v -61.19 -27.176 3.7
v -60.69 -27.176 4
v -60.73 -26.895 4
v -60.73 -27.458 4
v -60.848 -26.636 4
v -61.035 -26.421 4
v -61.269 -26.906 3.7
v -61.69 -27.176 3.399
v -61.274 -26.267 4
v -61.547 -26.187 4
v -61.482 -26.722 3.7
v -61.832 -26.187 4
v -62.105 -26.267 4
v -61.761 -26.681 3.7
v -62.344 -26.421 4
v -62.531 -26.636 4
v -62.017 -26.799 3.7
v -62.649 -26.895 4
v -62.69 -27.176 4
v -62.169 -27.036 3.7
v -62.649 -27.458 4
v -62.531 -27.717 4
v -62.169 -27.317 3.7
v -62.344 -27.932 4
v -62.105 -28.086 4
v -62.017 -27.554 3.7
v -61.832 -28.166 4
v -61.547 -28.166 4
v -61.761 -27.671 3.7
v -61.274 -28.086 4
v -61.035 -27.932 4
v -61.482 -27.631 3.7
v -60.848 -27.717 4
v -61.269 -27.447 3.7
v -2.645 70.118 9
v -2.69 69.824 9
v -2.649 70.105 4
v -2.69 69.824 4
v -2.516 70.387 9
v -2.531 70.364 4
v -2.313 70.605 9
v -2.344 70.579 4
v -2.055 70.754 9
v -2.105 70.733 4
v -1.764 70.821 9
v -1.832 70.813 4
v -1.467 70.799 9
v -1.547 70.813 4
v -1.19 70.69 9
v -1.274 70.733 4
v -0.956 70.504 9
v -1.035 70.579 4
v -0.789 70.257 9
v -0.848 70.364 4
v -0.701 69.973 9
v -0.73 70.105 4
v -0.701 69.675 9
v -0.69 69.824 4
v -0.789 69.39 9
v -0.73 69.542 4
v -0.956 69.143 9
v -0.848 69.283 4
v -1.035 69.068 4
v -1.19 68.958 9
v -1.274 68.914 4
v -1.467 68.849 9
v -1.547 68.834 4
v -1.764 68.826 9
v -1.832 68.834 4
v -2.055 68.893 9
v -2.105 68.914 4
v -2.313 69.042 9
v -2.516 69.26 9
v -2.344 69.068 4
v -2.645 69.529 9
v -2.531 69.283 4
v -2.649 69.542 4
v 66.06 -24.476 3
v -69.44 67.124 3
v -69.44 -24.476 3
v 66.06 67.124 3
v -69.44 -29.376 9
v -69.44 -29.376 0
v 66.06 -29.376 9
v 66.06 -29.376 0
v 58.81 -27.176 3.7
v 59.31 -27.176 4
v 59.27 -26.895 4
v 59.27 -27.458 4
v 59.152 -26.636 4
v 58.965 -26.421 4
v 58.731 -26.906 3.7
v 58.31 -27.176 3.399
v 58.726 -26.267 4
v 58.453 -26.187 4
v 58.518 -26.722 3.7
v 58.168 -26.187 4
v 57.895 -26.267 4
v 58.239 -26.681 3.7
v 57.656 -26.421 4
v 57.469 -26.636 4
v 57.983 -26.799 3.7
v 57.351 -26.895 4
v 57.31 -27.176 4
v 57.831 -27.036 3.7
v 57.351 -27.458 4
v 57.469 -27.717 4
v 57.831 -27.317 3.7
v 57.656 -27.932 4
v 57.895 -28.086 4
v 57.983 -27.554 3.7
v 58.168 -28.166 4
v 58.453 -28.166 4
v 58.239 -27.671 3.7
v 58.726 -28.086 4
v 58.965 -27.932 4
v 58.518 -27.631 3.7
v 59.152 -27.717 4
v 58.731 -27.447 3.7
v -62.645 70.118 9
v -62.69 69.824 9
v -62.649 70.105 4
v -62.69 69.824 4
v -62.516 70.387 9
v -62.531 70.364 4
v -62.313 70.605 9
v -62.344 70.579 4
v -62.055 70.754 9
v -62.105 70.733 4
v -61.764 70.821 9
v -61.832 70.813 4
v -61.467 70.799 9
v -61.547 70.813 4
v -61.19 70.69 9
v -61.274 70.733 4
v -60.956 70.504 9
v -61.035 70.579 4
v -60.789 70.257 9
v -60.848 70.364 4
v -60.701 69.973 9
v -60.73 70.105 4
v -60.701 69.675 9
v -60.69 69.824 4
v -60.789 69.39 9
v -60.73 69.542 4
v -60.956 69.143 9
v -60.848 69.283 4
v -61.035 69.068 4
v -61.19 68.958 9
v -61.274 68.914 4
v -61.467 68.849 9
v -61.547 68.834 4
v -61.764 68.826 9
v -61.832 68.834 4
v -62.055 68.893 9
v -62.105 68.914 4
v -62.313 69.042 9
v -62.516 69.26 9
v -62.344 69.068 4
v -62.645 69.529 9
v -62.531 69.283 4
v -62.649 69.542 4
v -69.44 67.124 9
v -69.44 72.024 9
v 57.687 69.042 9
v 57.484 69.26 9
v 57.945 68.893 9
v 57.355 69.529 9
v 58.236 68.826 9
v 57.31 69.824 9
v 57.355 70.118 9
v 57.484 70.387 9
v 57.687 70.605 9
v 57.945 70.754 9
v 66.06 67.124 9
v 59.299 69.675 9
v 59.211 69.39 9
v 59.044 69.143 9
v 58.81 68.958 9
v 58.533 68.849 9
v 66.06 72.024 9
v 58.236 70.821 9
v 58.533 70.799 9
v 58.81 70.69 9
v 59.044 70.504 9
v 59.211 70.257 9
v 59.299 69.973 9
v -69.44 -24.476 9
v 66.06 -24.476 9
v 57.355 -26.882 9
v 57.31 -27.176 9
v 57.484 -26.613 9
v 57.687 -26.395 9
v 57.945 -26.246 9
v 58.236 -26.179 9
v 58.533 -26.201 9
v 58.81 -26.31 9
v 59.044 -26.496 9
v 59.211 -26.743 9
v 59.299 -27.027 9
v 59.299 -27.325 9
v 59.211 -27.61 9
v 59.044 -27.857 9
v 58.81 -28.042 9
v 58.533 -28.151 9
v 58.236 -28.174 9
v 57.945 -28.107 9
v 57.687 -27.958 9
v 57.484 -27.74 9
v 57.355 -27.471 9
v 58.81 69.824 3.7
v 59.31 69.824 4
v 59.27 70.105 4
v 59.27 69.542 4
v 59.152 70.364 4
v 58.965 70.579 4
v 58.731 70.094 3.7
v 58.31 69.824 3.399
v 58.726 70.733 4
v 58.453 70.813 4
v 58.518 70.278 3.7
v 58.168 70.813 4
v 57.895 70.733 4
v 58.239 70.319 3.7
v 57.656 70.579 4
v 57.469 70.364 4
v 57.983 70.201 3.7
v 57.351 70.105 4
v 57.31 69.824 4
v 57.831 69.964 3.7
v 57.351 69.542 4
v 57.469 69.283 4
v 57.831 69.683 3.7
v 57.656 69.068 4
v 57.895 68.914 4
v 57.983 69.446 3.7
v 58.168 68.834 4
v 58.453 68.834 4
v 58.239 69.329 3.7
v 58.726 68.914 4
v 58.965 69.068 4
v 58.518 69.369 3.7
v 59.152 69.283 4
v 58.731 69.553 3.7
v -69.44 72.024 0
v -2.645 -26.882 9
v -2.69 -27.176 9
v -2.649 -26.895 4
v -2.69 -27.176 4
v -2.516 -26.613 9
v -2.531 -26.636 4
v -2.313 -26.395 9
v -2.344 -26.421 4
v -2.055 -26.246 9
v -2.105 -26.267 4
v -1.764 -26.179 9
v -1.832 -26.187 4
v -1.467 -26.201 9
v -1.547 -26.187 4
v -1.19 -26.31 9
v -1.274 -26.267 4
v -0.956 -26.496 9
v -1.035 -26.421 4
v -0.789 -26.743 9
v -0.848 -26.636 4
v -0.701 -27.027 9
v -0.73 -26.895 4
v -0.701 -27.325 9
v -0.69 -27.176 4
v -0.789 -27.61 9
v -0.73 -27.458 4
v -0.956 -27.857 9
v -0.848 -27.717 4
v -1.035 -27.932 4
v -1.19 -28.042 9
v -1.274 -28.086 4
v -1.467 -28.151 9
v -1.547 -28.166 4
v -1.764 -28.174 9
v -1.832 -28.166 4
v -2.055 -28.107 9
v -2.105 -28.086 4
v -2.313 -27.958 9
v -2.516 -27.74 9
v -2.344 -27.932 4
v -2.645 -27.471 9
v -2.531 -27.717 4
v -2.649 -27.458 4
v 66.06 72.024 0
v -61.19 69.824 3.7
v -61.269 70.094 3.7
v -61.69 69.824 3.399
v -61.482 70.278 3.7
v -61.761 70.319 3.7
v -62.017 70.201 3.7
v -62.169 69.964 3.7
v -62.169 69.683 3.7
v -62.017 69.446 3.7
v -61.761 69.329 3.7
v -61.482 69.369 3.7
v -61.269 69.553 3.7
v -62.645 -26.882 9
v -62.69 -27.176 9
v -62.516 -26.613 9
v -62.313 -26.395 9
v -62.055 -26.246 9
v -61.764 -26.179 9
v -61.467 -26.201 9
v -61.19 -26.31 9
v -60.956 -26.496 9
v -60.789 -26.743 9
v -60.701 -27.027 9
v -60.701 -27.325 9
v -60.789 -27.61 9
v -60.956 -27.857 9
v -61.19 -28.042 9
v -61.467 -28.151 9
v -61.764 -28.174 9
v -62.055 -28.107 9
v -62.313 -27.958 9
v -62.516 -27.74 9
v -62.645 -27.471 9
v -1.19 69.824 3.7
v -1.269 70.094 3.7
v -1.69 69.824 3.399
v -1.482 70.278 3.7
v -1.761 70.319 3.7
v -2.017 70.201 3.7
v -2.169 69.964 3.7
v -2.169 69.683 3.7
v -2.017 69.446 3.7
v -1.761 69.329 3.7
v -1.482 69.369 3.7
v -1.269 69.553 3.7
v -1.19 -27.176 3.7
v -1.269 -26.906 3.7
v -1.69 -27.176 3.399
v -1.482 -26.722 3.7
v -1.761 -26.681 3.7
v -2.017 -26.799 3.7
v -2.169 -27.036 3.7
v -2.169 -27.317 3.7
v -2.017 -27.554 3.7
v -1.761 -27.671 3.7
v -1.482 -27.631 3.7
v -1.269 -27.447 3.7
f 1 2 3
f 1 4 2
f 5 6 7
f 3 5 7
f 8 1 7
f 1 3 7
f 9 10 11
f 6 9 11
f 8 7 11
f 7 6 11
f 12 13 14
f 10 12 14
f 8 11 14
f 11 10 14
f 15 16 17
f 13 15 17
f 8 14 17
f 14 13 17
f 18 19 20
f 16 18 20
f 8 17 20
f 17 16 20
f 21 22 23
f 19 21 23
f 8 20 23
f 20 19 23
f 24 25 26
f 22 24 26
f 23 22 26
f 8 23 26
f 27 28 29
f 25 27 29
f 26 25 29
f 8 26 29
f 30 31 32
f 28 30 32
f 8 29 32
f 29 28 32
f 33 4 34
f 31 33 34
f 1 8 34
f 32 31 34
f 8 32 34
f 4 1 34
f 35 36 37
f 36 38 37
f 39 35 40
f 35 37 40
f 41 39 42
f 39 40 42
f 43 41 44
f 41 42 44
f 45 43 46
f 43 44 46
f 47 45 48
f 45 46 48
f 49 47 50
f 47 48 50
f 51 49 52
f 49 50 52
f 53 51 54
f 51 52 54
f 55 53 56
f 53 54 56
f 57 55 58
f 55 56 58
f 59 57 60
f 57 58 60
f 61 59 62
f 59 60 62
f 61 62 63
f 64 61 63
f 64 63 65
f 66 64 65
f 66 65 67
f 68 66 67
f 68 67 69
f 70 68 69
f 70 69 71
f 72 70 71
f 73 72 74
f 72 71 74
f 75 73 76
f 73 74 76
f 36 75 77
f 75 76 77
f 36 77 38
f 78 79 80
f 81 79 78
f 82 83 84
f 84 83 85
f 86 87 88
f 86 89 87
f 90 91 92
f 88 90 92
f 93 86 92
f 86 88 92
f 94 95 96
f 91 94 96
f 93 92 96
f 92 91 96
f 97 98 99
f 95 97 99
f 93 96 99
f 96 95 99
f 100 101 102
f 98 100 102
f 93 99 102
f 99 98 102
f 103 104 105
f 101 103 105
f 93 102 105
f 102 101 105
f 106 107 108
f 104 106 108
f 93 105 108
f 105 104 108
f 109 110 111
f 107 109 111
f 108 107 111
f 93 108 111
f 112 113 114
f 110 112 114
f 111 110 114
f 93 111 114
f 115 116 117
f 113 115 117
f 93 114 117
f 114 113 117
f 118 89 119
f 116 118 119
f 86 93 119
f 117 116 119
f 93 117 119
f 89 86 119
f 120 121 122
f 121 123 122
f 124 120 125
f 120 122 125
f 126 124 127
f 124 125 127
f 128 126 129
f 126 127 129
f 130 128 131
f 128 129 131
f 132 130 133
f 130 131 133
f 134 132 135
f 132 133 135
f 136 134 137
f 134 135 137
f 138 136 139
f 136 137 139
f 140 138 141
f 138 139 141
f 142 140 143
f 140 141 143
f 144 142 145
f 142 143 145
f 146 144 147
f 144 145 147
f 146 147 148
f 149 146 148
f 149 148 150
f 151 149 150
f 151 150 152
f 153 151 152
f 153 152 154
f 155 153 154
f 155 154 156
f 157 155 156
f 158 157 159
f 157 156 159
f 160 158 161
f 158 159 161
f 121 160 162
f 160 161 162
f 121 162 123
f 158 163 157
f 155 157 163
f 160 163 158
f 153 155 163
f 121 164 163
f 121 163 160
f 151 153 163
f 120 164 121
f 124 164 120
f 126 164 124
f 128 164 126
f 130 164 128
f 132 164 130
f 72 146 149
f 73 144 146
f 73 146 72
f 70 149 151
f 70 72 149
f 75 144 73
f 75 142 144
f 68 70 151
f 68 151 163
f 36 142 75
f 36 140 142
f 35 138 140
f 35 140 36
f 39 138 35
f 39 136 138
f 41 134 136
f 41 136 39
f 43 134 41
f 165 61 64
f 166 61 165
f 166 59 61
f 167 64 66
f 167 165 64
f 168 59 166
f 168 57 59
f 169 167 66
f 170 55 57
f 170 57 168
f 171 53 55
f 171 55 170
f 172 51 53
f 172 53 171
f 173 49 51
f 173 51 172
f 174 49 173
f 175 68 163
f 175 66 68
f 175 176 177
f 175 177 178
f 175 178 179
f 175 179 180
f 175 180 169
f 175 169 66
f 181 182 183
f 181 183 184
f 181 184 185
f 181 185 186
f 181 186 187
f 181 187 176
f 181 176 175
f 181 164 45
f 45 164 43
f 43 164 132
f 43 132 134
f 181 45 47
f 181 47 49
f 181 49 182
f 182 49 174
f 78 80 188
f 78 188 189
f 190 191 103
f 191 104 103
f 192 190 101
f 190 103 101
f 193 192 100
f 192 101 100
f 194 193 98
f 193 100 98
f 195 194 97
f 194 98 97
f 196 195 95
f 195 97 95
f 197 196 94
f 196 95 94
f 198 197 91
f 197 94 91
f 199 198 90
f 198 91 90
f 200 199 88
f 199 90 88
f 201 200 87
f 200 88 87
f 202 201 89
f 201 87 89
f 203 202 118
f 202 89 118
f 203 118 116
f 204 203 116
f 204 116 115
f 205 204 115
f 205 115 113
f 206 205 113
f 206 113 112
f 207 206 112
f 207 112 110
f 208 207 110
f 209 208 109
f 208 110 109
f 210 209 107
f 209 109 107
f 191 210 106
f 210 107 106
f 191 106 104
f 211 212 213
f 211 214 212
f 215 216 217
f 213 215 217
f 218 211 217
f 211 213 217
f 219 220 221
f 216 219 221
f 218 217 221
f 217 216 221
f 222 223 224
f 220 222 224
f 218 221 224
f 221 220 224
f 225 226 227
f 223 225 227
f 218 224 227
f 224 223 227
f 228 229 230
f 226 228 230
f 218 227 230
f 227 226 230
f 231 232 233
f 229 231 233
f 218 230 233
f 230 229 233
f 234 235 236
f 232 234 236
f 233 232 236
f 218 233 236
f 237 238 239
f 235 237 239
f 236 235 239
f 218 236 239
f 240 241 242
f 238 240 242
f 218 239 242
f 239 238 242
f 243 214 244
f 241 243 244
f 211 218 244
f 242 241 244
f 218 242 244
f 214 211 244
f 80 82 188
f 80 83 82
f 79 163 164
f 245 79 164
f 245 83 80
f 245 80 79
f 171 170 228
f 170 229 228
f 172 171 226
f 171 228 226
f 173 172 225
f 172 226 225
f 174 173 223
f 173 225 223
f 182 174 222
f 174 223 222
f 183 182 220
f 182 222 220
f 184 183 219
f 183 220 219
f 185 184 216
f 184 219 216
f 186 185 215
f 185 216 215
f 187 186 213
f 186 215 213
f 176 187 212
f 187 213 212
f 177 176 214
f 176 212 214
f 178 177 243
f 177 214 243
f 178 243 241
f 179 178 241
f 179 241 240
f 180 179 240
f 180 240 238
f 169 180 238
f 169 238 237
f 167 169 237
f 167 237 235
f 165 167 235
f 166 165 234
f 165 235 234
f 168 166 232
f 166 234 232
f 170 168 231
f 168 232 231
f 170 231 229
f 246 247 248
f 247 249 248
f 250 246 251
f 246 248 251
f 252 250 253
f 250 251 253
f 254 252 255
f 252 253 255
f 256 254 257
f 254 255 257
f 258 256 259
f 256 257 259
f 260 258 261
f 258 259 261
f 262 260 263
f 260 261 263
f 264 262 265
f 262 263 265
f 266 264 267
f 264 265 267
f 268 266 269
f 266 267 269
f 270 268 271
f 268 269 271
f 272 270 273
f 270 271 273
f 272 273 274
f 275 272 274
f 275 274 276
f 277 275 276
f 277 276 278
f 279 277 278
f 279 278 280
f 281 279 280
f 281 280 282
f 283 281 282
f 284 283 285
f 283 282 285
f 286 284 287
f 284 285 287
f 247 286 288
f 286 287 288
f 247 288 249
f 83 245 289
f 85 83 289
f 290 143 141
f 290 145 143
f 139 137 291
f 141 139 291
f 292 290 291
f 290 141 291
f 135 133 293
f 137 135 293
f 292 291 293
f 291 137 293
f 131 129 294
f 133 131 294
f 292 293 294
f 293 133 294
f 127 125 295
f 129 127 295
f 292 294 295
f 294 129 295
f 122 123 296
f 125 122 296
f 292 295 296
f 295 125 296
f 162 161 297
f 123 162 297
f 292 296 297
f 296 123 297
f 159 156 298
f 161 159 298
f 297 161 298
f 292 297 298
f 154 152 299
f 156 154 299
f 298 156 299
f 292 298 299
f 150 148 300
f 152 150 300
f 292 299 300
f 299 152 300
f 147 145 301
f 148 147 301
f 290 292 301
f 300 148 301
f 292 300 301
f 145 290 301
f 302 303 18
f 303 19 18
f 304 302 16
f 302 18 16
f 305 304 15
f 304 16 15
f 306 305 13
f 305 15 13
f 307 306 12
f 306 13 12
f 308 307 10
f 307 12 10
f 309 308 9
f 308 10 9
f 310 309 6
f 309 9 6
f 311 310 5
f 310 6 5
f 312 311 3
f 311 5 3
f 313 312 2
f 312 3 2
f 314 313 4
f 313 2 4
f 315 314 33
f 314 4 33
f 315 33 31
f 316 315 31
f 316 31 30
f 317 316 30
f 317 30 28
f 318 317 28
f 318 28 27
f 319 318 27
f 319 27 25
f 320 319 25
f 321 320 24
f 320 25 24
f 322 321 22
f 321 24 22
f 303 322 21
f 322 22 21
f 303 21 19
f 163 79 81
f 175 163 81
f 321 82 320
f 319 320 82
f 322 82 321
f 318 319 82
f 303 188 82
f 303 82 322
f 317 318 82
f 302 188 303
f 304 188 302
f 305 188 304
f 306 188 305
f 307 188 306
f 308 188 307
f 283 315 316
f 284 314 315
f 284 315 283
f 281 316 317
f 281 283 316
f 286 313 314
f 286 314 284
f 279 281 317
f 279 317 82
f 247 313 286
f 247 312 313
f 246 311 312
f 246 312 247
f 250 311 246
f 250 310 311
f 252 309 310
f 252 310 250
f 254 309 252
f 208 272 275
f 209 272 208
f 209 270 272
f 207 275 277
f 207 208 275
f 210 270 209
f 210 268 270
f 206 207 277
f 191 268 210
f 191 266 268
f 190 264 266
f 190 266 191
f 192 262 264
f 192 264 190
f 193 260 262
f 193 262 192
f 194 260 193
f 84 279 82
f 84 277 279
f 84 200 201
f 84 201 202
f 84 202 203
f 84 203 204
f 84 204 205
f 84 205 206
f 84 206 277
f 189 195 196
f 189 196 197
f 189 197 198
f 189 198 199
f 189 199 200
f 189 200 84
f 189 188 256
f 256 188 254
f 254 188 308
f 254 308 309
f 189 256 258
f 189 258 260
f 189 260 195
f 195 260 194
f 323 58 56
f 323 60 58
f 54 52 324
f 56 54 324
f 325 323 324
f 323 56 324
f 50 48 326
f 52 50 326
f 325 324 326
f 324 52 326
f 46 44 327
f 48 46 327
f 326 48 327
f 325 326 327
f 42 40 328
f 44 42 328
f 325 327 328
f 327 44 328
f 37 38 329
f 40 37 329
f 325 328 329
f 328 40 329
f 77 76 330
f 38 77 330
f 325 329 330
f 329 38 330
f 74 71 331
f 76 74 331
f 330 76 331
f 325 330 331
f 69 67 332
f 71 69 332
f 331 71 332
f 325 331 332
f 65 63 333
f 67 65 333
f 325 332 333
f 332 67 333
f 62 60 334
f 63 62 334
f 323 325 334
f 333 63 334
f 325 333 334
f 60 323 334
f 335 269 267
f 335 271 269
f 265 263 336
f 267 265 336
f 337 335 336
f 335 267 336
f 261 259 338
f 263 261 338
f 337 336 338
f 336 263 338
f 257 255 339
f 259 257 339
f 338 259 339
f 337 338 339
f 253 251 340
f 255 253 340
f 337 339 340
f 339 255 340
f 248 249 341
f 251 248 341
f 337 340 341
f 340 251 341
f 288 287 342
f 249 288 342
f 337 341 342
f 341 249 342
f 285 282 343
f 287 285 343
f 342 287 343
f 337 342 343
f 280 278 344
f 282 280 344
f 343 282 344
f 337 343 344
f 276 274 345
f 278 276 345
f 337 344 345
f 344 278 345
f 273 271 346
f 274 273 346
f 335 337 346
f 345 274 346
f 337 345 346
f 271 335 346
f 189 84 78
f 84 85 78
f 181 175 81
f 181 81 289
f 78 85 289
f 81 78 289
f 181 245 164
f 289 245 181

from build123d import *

# Parameters (mm, degrees)
F0_W     = 135.5
F0_H     = 101.4
F1_DEPTH = 3
F2_W     = 135.5
F2_H     = 4.9
F3_DEPTH = 6
F4_DEPTH = 6
F6_D     = 2
F6_DEPTH = 5
F6_TIP   = 0.600860619


with BuildPart() as f1:
    # F0 (on Top) → F1 (new body)
    with BuildSketch(Plane.XY):
        with Locations((-1.68951042, 21.3235962429)):
            Rectangle(F0_W, F0_H)
    extrude(amount=F1_DEPTH)

    # F2 (on face) → F3 (join)
    with BuildSketch(Plane.XY.offset(3)):
        with Locations((-1.68951042, -26.9264037571)):
            Rectangle(F2_W, F2_H)
    extrude(amount=F3_DEPTH)

    # F2 (on face) → F4 (join)
    with BuildSketch(Plane.XY.offset(3)):
        with Locations((-1.68951042, -26.9264037571)):
            Rectangle(F2_W, F2_H)
        with Locations((-1.68951042, 69.5735962429)):
            Rectangle(F2_W, F2_H)
    extrude(amount=F4_DEPTH)

    # F6
    with Locations(Plane.XY.offset(9)):
        with Locations((-61.68951042, 69.8235962429), (-1.68951042, 69.8235962429), (58.31048958, 69.8235962429), (58.31048958, -27.1764037571), (-1.68951042, -27.1764037571), (-61.68951042, -27.1764037571)):
            Hole(F6_D / 2, depth=F6_DEPTH)
            with Locations((0, 0, -(F6_DEPTH + F6_TIP / 2))):  # 118° drill point
                Cone(0, F6_D / 2, F6_TIP, mode=Mode.SUBTRACT)


solid = f1.part
